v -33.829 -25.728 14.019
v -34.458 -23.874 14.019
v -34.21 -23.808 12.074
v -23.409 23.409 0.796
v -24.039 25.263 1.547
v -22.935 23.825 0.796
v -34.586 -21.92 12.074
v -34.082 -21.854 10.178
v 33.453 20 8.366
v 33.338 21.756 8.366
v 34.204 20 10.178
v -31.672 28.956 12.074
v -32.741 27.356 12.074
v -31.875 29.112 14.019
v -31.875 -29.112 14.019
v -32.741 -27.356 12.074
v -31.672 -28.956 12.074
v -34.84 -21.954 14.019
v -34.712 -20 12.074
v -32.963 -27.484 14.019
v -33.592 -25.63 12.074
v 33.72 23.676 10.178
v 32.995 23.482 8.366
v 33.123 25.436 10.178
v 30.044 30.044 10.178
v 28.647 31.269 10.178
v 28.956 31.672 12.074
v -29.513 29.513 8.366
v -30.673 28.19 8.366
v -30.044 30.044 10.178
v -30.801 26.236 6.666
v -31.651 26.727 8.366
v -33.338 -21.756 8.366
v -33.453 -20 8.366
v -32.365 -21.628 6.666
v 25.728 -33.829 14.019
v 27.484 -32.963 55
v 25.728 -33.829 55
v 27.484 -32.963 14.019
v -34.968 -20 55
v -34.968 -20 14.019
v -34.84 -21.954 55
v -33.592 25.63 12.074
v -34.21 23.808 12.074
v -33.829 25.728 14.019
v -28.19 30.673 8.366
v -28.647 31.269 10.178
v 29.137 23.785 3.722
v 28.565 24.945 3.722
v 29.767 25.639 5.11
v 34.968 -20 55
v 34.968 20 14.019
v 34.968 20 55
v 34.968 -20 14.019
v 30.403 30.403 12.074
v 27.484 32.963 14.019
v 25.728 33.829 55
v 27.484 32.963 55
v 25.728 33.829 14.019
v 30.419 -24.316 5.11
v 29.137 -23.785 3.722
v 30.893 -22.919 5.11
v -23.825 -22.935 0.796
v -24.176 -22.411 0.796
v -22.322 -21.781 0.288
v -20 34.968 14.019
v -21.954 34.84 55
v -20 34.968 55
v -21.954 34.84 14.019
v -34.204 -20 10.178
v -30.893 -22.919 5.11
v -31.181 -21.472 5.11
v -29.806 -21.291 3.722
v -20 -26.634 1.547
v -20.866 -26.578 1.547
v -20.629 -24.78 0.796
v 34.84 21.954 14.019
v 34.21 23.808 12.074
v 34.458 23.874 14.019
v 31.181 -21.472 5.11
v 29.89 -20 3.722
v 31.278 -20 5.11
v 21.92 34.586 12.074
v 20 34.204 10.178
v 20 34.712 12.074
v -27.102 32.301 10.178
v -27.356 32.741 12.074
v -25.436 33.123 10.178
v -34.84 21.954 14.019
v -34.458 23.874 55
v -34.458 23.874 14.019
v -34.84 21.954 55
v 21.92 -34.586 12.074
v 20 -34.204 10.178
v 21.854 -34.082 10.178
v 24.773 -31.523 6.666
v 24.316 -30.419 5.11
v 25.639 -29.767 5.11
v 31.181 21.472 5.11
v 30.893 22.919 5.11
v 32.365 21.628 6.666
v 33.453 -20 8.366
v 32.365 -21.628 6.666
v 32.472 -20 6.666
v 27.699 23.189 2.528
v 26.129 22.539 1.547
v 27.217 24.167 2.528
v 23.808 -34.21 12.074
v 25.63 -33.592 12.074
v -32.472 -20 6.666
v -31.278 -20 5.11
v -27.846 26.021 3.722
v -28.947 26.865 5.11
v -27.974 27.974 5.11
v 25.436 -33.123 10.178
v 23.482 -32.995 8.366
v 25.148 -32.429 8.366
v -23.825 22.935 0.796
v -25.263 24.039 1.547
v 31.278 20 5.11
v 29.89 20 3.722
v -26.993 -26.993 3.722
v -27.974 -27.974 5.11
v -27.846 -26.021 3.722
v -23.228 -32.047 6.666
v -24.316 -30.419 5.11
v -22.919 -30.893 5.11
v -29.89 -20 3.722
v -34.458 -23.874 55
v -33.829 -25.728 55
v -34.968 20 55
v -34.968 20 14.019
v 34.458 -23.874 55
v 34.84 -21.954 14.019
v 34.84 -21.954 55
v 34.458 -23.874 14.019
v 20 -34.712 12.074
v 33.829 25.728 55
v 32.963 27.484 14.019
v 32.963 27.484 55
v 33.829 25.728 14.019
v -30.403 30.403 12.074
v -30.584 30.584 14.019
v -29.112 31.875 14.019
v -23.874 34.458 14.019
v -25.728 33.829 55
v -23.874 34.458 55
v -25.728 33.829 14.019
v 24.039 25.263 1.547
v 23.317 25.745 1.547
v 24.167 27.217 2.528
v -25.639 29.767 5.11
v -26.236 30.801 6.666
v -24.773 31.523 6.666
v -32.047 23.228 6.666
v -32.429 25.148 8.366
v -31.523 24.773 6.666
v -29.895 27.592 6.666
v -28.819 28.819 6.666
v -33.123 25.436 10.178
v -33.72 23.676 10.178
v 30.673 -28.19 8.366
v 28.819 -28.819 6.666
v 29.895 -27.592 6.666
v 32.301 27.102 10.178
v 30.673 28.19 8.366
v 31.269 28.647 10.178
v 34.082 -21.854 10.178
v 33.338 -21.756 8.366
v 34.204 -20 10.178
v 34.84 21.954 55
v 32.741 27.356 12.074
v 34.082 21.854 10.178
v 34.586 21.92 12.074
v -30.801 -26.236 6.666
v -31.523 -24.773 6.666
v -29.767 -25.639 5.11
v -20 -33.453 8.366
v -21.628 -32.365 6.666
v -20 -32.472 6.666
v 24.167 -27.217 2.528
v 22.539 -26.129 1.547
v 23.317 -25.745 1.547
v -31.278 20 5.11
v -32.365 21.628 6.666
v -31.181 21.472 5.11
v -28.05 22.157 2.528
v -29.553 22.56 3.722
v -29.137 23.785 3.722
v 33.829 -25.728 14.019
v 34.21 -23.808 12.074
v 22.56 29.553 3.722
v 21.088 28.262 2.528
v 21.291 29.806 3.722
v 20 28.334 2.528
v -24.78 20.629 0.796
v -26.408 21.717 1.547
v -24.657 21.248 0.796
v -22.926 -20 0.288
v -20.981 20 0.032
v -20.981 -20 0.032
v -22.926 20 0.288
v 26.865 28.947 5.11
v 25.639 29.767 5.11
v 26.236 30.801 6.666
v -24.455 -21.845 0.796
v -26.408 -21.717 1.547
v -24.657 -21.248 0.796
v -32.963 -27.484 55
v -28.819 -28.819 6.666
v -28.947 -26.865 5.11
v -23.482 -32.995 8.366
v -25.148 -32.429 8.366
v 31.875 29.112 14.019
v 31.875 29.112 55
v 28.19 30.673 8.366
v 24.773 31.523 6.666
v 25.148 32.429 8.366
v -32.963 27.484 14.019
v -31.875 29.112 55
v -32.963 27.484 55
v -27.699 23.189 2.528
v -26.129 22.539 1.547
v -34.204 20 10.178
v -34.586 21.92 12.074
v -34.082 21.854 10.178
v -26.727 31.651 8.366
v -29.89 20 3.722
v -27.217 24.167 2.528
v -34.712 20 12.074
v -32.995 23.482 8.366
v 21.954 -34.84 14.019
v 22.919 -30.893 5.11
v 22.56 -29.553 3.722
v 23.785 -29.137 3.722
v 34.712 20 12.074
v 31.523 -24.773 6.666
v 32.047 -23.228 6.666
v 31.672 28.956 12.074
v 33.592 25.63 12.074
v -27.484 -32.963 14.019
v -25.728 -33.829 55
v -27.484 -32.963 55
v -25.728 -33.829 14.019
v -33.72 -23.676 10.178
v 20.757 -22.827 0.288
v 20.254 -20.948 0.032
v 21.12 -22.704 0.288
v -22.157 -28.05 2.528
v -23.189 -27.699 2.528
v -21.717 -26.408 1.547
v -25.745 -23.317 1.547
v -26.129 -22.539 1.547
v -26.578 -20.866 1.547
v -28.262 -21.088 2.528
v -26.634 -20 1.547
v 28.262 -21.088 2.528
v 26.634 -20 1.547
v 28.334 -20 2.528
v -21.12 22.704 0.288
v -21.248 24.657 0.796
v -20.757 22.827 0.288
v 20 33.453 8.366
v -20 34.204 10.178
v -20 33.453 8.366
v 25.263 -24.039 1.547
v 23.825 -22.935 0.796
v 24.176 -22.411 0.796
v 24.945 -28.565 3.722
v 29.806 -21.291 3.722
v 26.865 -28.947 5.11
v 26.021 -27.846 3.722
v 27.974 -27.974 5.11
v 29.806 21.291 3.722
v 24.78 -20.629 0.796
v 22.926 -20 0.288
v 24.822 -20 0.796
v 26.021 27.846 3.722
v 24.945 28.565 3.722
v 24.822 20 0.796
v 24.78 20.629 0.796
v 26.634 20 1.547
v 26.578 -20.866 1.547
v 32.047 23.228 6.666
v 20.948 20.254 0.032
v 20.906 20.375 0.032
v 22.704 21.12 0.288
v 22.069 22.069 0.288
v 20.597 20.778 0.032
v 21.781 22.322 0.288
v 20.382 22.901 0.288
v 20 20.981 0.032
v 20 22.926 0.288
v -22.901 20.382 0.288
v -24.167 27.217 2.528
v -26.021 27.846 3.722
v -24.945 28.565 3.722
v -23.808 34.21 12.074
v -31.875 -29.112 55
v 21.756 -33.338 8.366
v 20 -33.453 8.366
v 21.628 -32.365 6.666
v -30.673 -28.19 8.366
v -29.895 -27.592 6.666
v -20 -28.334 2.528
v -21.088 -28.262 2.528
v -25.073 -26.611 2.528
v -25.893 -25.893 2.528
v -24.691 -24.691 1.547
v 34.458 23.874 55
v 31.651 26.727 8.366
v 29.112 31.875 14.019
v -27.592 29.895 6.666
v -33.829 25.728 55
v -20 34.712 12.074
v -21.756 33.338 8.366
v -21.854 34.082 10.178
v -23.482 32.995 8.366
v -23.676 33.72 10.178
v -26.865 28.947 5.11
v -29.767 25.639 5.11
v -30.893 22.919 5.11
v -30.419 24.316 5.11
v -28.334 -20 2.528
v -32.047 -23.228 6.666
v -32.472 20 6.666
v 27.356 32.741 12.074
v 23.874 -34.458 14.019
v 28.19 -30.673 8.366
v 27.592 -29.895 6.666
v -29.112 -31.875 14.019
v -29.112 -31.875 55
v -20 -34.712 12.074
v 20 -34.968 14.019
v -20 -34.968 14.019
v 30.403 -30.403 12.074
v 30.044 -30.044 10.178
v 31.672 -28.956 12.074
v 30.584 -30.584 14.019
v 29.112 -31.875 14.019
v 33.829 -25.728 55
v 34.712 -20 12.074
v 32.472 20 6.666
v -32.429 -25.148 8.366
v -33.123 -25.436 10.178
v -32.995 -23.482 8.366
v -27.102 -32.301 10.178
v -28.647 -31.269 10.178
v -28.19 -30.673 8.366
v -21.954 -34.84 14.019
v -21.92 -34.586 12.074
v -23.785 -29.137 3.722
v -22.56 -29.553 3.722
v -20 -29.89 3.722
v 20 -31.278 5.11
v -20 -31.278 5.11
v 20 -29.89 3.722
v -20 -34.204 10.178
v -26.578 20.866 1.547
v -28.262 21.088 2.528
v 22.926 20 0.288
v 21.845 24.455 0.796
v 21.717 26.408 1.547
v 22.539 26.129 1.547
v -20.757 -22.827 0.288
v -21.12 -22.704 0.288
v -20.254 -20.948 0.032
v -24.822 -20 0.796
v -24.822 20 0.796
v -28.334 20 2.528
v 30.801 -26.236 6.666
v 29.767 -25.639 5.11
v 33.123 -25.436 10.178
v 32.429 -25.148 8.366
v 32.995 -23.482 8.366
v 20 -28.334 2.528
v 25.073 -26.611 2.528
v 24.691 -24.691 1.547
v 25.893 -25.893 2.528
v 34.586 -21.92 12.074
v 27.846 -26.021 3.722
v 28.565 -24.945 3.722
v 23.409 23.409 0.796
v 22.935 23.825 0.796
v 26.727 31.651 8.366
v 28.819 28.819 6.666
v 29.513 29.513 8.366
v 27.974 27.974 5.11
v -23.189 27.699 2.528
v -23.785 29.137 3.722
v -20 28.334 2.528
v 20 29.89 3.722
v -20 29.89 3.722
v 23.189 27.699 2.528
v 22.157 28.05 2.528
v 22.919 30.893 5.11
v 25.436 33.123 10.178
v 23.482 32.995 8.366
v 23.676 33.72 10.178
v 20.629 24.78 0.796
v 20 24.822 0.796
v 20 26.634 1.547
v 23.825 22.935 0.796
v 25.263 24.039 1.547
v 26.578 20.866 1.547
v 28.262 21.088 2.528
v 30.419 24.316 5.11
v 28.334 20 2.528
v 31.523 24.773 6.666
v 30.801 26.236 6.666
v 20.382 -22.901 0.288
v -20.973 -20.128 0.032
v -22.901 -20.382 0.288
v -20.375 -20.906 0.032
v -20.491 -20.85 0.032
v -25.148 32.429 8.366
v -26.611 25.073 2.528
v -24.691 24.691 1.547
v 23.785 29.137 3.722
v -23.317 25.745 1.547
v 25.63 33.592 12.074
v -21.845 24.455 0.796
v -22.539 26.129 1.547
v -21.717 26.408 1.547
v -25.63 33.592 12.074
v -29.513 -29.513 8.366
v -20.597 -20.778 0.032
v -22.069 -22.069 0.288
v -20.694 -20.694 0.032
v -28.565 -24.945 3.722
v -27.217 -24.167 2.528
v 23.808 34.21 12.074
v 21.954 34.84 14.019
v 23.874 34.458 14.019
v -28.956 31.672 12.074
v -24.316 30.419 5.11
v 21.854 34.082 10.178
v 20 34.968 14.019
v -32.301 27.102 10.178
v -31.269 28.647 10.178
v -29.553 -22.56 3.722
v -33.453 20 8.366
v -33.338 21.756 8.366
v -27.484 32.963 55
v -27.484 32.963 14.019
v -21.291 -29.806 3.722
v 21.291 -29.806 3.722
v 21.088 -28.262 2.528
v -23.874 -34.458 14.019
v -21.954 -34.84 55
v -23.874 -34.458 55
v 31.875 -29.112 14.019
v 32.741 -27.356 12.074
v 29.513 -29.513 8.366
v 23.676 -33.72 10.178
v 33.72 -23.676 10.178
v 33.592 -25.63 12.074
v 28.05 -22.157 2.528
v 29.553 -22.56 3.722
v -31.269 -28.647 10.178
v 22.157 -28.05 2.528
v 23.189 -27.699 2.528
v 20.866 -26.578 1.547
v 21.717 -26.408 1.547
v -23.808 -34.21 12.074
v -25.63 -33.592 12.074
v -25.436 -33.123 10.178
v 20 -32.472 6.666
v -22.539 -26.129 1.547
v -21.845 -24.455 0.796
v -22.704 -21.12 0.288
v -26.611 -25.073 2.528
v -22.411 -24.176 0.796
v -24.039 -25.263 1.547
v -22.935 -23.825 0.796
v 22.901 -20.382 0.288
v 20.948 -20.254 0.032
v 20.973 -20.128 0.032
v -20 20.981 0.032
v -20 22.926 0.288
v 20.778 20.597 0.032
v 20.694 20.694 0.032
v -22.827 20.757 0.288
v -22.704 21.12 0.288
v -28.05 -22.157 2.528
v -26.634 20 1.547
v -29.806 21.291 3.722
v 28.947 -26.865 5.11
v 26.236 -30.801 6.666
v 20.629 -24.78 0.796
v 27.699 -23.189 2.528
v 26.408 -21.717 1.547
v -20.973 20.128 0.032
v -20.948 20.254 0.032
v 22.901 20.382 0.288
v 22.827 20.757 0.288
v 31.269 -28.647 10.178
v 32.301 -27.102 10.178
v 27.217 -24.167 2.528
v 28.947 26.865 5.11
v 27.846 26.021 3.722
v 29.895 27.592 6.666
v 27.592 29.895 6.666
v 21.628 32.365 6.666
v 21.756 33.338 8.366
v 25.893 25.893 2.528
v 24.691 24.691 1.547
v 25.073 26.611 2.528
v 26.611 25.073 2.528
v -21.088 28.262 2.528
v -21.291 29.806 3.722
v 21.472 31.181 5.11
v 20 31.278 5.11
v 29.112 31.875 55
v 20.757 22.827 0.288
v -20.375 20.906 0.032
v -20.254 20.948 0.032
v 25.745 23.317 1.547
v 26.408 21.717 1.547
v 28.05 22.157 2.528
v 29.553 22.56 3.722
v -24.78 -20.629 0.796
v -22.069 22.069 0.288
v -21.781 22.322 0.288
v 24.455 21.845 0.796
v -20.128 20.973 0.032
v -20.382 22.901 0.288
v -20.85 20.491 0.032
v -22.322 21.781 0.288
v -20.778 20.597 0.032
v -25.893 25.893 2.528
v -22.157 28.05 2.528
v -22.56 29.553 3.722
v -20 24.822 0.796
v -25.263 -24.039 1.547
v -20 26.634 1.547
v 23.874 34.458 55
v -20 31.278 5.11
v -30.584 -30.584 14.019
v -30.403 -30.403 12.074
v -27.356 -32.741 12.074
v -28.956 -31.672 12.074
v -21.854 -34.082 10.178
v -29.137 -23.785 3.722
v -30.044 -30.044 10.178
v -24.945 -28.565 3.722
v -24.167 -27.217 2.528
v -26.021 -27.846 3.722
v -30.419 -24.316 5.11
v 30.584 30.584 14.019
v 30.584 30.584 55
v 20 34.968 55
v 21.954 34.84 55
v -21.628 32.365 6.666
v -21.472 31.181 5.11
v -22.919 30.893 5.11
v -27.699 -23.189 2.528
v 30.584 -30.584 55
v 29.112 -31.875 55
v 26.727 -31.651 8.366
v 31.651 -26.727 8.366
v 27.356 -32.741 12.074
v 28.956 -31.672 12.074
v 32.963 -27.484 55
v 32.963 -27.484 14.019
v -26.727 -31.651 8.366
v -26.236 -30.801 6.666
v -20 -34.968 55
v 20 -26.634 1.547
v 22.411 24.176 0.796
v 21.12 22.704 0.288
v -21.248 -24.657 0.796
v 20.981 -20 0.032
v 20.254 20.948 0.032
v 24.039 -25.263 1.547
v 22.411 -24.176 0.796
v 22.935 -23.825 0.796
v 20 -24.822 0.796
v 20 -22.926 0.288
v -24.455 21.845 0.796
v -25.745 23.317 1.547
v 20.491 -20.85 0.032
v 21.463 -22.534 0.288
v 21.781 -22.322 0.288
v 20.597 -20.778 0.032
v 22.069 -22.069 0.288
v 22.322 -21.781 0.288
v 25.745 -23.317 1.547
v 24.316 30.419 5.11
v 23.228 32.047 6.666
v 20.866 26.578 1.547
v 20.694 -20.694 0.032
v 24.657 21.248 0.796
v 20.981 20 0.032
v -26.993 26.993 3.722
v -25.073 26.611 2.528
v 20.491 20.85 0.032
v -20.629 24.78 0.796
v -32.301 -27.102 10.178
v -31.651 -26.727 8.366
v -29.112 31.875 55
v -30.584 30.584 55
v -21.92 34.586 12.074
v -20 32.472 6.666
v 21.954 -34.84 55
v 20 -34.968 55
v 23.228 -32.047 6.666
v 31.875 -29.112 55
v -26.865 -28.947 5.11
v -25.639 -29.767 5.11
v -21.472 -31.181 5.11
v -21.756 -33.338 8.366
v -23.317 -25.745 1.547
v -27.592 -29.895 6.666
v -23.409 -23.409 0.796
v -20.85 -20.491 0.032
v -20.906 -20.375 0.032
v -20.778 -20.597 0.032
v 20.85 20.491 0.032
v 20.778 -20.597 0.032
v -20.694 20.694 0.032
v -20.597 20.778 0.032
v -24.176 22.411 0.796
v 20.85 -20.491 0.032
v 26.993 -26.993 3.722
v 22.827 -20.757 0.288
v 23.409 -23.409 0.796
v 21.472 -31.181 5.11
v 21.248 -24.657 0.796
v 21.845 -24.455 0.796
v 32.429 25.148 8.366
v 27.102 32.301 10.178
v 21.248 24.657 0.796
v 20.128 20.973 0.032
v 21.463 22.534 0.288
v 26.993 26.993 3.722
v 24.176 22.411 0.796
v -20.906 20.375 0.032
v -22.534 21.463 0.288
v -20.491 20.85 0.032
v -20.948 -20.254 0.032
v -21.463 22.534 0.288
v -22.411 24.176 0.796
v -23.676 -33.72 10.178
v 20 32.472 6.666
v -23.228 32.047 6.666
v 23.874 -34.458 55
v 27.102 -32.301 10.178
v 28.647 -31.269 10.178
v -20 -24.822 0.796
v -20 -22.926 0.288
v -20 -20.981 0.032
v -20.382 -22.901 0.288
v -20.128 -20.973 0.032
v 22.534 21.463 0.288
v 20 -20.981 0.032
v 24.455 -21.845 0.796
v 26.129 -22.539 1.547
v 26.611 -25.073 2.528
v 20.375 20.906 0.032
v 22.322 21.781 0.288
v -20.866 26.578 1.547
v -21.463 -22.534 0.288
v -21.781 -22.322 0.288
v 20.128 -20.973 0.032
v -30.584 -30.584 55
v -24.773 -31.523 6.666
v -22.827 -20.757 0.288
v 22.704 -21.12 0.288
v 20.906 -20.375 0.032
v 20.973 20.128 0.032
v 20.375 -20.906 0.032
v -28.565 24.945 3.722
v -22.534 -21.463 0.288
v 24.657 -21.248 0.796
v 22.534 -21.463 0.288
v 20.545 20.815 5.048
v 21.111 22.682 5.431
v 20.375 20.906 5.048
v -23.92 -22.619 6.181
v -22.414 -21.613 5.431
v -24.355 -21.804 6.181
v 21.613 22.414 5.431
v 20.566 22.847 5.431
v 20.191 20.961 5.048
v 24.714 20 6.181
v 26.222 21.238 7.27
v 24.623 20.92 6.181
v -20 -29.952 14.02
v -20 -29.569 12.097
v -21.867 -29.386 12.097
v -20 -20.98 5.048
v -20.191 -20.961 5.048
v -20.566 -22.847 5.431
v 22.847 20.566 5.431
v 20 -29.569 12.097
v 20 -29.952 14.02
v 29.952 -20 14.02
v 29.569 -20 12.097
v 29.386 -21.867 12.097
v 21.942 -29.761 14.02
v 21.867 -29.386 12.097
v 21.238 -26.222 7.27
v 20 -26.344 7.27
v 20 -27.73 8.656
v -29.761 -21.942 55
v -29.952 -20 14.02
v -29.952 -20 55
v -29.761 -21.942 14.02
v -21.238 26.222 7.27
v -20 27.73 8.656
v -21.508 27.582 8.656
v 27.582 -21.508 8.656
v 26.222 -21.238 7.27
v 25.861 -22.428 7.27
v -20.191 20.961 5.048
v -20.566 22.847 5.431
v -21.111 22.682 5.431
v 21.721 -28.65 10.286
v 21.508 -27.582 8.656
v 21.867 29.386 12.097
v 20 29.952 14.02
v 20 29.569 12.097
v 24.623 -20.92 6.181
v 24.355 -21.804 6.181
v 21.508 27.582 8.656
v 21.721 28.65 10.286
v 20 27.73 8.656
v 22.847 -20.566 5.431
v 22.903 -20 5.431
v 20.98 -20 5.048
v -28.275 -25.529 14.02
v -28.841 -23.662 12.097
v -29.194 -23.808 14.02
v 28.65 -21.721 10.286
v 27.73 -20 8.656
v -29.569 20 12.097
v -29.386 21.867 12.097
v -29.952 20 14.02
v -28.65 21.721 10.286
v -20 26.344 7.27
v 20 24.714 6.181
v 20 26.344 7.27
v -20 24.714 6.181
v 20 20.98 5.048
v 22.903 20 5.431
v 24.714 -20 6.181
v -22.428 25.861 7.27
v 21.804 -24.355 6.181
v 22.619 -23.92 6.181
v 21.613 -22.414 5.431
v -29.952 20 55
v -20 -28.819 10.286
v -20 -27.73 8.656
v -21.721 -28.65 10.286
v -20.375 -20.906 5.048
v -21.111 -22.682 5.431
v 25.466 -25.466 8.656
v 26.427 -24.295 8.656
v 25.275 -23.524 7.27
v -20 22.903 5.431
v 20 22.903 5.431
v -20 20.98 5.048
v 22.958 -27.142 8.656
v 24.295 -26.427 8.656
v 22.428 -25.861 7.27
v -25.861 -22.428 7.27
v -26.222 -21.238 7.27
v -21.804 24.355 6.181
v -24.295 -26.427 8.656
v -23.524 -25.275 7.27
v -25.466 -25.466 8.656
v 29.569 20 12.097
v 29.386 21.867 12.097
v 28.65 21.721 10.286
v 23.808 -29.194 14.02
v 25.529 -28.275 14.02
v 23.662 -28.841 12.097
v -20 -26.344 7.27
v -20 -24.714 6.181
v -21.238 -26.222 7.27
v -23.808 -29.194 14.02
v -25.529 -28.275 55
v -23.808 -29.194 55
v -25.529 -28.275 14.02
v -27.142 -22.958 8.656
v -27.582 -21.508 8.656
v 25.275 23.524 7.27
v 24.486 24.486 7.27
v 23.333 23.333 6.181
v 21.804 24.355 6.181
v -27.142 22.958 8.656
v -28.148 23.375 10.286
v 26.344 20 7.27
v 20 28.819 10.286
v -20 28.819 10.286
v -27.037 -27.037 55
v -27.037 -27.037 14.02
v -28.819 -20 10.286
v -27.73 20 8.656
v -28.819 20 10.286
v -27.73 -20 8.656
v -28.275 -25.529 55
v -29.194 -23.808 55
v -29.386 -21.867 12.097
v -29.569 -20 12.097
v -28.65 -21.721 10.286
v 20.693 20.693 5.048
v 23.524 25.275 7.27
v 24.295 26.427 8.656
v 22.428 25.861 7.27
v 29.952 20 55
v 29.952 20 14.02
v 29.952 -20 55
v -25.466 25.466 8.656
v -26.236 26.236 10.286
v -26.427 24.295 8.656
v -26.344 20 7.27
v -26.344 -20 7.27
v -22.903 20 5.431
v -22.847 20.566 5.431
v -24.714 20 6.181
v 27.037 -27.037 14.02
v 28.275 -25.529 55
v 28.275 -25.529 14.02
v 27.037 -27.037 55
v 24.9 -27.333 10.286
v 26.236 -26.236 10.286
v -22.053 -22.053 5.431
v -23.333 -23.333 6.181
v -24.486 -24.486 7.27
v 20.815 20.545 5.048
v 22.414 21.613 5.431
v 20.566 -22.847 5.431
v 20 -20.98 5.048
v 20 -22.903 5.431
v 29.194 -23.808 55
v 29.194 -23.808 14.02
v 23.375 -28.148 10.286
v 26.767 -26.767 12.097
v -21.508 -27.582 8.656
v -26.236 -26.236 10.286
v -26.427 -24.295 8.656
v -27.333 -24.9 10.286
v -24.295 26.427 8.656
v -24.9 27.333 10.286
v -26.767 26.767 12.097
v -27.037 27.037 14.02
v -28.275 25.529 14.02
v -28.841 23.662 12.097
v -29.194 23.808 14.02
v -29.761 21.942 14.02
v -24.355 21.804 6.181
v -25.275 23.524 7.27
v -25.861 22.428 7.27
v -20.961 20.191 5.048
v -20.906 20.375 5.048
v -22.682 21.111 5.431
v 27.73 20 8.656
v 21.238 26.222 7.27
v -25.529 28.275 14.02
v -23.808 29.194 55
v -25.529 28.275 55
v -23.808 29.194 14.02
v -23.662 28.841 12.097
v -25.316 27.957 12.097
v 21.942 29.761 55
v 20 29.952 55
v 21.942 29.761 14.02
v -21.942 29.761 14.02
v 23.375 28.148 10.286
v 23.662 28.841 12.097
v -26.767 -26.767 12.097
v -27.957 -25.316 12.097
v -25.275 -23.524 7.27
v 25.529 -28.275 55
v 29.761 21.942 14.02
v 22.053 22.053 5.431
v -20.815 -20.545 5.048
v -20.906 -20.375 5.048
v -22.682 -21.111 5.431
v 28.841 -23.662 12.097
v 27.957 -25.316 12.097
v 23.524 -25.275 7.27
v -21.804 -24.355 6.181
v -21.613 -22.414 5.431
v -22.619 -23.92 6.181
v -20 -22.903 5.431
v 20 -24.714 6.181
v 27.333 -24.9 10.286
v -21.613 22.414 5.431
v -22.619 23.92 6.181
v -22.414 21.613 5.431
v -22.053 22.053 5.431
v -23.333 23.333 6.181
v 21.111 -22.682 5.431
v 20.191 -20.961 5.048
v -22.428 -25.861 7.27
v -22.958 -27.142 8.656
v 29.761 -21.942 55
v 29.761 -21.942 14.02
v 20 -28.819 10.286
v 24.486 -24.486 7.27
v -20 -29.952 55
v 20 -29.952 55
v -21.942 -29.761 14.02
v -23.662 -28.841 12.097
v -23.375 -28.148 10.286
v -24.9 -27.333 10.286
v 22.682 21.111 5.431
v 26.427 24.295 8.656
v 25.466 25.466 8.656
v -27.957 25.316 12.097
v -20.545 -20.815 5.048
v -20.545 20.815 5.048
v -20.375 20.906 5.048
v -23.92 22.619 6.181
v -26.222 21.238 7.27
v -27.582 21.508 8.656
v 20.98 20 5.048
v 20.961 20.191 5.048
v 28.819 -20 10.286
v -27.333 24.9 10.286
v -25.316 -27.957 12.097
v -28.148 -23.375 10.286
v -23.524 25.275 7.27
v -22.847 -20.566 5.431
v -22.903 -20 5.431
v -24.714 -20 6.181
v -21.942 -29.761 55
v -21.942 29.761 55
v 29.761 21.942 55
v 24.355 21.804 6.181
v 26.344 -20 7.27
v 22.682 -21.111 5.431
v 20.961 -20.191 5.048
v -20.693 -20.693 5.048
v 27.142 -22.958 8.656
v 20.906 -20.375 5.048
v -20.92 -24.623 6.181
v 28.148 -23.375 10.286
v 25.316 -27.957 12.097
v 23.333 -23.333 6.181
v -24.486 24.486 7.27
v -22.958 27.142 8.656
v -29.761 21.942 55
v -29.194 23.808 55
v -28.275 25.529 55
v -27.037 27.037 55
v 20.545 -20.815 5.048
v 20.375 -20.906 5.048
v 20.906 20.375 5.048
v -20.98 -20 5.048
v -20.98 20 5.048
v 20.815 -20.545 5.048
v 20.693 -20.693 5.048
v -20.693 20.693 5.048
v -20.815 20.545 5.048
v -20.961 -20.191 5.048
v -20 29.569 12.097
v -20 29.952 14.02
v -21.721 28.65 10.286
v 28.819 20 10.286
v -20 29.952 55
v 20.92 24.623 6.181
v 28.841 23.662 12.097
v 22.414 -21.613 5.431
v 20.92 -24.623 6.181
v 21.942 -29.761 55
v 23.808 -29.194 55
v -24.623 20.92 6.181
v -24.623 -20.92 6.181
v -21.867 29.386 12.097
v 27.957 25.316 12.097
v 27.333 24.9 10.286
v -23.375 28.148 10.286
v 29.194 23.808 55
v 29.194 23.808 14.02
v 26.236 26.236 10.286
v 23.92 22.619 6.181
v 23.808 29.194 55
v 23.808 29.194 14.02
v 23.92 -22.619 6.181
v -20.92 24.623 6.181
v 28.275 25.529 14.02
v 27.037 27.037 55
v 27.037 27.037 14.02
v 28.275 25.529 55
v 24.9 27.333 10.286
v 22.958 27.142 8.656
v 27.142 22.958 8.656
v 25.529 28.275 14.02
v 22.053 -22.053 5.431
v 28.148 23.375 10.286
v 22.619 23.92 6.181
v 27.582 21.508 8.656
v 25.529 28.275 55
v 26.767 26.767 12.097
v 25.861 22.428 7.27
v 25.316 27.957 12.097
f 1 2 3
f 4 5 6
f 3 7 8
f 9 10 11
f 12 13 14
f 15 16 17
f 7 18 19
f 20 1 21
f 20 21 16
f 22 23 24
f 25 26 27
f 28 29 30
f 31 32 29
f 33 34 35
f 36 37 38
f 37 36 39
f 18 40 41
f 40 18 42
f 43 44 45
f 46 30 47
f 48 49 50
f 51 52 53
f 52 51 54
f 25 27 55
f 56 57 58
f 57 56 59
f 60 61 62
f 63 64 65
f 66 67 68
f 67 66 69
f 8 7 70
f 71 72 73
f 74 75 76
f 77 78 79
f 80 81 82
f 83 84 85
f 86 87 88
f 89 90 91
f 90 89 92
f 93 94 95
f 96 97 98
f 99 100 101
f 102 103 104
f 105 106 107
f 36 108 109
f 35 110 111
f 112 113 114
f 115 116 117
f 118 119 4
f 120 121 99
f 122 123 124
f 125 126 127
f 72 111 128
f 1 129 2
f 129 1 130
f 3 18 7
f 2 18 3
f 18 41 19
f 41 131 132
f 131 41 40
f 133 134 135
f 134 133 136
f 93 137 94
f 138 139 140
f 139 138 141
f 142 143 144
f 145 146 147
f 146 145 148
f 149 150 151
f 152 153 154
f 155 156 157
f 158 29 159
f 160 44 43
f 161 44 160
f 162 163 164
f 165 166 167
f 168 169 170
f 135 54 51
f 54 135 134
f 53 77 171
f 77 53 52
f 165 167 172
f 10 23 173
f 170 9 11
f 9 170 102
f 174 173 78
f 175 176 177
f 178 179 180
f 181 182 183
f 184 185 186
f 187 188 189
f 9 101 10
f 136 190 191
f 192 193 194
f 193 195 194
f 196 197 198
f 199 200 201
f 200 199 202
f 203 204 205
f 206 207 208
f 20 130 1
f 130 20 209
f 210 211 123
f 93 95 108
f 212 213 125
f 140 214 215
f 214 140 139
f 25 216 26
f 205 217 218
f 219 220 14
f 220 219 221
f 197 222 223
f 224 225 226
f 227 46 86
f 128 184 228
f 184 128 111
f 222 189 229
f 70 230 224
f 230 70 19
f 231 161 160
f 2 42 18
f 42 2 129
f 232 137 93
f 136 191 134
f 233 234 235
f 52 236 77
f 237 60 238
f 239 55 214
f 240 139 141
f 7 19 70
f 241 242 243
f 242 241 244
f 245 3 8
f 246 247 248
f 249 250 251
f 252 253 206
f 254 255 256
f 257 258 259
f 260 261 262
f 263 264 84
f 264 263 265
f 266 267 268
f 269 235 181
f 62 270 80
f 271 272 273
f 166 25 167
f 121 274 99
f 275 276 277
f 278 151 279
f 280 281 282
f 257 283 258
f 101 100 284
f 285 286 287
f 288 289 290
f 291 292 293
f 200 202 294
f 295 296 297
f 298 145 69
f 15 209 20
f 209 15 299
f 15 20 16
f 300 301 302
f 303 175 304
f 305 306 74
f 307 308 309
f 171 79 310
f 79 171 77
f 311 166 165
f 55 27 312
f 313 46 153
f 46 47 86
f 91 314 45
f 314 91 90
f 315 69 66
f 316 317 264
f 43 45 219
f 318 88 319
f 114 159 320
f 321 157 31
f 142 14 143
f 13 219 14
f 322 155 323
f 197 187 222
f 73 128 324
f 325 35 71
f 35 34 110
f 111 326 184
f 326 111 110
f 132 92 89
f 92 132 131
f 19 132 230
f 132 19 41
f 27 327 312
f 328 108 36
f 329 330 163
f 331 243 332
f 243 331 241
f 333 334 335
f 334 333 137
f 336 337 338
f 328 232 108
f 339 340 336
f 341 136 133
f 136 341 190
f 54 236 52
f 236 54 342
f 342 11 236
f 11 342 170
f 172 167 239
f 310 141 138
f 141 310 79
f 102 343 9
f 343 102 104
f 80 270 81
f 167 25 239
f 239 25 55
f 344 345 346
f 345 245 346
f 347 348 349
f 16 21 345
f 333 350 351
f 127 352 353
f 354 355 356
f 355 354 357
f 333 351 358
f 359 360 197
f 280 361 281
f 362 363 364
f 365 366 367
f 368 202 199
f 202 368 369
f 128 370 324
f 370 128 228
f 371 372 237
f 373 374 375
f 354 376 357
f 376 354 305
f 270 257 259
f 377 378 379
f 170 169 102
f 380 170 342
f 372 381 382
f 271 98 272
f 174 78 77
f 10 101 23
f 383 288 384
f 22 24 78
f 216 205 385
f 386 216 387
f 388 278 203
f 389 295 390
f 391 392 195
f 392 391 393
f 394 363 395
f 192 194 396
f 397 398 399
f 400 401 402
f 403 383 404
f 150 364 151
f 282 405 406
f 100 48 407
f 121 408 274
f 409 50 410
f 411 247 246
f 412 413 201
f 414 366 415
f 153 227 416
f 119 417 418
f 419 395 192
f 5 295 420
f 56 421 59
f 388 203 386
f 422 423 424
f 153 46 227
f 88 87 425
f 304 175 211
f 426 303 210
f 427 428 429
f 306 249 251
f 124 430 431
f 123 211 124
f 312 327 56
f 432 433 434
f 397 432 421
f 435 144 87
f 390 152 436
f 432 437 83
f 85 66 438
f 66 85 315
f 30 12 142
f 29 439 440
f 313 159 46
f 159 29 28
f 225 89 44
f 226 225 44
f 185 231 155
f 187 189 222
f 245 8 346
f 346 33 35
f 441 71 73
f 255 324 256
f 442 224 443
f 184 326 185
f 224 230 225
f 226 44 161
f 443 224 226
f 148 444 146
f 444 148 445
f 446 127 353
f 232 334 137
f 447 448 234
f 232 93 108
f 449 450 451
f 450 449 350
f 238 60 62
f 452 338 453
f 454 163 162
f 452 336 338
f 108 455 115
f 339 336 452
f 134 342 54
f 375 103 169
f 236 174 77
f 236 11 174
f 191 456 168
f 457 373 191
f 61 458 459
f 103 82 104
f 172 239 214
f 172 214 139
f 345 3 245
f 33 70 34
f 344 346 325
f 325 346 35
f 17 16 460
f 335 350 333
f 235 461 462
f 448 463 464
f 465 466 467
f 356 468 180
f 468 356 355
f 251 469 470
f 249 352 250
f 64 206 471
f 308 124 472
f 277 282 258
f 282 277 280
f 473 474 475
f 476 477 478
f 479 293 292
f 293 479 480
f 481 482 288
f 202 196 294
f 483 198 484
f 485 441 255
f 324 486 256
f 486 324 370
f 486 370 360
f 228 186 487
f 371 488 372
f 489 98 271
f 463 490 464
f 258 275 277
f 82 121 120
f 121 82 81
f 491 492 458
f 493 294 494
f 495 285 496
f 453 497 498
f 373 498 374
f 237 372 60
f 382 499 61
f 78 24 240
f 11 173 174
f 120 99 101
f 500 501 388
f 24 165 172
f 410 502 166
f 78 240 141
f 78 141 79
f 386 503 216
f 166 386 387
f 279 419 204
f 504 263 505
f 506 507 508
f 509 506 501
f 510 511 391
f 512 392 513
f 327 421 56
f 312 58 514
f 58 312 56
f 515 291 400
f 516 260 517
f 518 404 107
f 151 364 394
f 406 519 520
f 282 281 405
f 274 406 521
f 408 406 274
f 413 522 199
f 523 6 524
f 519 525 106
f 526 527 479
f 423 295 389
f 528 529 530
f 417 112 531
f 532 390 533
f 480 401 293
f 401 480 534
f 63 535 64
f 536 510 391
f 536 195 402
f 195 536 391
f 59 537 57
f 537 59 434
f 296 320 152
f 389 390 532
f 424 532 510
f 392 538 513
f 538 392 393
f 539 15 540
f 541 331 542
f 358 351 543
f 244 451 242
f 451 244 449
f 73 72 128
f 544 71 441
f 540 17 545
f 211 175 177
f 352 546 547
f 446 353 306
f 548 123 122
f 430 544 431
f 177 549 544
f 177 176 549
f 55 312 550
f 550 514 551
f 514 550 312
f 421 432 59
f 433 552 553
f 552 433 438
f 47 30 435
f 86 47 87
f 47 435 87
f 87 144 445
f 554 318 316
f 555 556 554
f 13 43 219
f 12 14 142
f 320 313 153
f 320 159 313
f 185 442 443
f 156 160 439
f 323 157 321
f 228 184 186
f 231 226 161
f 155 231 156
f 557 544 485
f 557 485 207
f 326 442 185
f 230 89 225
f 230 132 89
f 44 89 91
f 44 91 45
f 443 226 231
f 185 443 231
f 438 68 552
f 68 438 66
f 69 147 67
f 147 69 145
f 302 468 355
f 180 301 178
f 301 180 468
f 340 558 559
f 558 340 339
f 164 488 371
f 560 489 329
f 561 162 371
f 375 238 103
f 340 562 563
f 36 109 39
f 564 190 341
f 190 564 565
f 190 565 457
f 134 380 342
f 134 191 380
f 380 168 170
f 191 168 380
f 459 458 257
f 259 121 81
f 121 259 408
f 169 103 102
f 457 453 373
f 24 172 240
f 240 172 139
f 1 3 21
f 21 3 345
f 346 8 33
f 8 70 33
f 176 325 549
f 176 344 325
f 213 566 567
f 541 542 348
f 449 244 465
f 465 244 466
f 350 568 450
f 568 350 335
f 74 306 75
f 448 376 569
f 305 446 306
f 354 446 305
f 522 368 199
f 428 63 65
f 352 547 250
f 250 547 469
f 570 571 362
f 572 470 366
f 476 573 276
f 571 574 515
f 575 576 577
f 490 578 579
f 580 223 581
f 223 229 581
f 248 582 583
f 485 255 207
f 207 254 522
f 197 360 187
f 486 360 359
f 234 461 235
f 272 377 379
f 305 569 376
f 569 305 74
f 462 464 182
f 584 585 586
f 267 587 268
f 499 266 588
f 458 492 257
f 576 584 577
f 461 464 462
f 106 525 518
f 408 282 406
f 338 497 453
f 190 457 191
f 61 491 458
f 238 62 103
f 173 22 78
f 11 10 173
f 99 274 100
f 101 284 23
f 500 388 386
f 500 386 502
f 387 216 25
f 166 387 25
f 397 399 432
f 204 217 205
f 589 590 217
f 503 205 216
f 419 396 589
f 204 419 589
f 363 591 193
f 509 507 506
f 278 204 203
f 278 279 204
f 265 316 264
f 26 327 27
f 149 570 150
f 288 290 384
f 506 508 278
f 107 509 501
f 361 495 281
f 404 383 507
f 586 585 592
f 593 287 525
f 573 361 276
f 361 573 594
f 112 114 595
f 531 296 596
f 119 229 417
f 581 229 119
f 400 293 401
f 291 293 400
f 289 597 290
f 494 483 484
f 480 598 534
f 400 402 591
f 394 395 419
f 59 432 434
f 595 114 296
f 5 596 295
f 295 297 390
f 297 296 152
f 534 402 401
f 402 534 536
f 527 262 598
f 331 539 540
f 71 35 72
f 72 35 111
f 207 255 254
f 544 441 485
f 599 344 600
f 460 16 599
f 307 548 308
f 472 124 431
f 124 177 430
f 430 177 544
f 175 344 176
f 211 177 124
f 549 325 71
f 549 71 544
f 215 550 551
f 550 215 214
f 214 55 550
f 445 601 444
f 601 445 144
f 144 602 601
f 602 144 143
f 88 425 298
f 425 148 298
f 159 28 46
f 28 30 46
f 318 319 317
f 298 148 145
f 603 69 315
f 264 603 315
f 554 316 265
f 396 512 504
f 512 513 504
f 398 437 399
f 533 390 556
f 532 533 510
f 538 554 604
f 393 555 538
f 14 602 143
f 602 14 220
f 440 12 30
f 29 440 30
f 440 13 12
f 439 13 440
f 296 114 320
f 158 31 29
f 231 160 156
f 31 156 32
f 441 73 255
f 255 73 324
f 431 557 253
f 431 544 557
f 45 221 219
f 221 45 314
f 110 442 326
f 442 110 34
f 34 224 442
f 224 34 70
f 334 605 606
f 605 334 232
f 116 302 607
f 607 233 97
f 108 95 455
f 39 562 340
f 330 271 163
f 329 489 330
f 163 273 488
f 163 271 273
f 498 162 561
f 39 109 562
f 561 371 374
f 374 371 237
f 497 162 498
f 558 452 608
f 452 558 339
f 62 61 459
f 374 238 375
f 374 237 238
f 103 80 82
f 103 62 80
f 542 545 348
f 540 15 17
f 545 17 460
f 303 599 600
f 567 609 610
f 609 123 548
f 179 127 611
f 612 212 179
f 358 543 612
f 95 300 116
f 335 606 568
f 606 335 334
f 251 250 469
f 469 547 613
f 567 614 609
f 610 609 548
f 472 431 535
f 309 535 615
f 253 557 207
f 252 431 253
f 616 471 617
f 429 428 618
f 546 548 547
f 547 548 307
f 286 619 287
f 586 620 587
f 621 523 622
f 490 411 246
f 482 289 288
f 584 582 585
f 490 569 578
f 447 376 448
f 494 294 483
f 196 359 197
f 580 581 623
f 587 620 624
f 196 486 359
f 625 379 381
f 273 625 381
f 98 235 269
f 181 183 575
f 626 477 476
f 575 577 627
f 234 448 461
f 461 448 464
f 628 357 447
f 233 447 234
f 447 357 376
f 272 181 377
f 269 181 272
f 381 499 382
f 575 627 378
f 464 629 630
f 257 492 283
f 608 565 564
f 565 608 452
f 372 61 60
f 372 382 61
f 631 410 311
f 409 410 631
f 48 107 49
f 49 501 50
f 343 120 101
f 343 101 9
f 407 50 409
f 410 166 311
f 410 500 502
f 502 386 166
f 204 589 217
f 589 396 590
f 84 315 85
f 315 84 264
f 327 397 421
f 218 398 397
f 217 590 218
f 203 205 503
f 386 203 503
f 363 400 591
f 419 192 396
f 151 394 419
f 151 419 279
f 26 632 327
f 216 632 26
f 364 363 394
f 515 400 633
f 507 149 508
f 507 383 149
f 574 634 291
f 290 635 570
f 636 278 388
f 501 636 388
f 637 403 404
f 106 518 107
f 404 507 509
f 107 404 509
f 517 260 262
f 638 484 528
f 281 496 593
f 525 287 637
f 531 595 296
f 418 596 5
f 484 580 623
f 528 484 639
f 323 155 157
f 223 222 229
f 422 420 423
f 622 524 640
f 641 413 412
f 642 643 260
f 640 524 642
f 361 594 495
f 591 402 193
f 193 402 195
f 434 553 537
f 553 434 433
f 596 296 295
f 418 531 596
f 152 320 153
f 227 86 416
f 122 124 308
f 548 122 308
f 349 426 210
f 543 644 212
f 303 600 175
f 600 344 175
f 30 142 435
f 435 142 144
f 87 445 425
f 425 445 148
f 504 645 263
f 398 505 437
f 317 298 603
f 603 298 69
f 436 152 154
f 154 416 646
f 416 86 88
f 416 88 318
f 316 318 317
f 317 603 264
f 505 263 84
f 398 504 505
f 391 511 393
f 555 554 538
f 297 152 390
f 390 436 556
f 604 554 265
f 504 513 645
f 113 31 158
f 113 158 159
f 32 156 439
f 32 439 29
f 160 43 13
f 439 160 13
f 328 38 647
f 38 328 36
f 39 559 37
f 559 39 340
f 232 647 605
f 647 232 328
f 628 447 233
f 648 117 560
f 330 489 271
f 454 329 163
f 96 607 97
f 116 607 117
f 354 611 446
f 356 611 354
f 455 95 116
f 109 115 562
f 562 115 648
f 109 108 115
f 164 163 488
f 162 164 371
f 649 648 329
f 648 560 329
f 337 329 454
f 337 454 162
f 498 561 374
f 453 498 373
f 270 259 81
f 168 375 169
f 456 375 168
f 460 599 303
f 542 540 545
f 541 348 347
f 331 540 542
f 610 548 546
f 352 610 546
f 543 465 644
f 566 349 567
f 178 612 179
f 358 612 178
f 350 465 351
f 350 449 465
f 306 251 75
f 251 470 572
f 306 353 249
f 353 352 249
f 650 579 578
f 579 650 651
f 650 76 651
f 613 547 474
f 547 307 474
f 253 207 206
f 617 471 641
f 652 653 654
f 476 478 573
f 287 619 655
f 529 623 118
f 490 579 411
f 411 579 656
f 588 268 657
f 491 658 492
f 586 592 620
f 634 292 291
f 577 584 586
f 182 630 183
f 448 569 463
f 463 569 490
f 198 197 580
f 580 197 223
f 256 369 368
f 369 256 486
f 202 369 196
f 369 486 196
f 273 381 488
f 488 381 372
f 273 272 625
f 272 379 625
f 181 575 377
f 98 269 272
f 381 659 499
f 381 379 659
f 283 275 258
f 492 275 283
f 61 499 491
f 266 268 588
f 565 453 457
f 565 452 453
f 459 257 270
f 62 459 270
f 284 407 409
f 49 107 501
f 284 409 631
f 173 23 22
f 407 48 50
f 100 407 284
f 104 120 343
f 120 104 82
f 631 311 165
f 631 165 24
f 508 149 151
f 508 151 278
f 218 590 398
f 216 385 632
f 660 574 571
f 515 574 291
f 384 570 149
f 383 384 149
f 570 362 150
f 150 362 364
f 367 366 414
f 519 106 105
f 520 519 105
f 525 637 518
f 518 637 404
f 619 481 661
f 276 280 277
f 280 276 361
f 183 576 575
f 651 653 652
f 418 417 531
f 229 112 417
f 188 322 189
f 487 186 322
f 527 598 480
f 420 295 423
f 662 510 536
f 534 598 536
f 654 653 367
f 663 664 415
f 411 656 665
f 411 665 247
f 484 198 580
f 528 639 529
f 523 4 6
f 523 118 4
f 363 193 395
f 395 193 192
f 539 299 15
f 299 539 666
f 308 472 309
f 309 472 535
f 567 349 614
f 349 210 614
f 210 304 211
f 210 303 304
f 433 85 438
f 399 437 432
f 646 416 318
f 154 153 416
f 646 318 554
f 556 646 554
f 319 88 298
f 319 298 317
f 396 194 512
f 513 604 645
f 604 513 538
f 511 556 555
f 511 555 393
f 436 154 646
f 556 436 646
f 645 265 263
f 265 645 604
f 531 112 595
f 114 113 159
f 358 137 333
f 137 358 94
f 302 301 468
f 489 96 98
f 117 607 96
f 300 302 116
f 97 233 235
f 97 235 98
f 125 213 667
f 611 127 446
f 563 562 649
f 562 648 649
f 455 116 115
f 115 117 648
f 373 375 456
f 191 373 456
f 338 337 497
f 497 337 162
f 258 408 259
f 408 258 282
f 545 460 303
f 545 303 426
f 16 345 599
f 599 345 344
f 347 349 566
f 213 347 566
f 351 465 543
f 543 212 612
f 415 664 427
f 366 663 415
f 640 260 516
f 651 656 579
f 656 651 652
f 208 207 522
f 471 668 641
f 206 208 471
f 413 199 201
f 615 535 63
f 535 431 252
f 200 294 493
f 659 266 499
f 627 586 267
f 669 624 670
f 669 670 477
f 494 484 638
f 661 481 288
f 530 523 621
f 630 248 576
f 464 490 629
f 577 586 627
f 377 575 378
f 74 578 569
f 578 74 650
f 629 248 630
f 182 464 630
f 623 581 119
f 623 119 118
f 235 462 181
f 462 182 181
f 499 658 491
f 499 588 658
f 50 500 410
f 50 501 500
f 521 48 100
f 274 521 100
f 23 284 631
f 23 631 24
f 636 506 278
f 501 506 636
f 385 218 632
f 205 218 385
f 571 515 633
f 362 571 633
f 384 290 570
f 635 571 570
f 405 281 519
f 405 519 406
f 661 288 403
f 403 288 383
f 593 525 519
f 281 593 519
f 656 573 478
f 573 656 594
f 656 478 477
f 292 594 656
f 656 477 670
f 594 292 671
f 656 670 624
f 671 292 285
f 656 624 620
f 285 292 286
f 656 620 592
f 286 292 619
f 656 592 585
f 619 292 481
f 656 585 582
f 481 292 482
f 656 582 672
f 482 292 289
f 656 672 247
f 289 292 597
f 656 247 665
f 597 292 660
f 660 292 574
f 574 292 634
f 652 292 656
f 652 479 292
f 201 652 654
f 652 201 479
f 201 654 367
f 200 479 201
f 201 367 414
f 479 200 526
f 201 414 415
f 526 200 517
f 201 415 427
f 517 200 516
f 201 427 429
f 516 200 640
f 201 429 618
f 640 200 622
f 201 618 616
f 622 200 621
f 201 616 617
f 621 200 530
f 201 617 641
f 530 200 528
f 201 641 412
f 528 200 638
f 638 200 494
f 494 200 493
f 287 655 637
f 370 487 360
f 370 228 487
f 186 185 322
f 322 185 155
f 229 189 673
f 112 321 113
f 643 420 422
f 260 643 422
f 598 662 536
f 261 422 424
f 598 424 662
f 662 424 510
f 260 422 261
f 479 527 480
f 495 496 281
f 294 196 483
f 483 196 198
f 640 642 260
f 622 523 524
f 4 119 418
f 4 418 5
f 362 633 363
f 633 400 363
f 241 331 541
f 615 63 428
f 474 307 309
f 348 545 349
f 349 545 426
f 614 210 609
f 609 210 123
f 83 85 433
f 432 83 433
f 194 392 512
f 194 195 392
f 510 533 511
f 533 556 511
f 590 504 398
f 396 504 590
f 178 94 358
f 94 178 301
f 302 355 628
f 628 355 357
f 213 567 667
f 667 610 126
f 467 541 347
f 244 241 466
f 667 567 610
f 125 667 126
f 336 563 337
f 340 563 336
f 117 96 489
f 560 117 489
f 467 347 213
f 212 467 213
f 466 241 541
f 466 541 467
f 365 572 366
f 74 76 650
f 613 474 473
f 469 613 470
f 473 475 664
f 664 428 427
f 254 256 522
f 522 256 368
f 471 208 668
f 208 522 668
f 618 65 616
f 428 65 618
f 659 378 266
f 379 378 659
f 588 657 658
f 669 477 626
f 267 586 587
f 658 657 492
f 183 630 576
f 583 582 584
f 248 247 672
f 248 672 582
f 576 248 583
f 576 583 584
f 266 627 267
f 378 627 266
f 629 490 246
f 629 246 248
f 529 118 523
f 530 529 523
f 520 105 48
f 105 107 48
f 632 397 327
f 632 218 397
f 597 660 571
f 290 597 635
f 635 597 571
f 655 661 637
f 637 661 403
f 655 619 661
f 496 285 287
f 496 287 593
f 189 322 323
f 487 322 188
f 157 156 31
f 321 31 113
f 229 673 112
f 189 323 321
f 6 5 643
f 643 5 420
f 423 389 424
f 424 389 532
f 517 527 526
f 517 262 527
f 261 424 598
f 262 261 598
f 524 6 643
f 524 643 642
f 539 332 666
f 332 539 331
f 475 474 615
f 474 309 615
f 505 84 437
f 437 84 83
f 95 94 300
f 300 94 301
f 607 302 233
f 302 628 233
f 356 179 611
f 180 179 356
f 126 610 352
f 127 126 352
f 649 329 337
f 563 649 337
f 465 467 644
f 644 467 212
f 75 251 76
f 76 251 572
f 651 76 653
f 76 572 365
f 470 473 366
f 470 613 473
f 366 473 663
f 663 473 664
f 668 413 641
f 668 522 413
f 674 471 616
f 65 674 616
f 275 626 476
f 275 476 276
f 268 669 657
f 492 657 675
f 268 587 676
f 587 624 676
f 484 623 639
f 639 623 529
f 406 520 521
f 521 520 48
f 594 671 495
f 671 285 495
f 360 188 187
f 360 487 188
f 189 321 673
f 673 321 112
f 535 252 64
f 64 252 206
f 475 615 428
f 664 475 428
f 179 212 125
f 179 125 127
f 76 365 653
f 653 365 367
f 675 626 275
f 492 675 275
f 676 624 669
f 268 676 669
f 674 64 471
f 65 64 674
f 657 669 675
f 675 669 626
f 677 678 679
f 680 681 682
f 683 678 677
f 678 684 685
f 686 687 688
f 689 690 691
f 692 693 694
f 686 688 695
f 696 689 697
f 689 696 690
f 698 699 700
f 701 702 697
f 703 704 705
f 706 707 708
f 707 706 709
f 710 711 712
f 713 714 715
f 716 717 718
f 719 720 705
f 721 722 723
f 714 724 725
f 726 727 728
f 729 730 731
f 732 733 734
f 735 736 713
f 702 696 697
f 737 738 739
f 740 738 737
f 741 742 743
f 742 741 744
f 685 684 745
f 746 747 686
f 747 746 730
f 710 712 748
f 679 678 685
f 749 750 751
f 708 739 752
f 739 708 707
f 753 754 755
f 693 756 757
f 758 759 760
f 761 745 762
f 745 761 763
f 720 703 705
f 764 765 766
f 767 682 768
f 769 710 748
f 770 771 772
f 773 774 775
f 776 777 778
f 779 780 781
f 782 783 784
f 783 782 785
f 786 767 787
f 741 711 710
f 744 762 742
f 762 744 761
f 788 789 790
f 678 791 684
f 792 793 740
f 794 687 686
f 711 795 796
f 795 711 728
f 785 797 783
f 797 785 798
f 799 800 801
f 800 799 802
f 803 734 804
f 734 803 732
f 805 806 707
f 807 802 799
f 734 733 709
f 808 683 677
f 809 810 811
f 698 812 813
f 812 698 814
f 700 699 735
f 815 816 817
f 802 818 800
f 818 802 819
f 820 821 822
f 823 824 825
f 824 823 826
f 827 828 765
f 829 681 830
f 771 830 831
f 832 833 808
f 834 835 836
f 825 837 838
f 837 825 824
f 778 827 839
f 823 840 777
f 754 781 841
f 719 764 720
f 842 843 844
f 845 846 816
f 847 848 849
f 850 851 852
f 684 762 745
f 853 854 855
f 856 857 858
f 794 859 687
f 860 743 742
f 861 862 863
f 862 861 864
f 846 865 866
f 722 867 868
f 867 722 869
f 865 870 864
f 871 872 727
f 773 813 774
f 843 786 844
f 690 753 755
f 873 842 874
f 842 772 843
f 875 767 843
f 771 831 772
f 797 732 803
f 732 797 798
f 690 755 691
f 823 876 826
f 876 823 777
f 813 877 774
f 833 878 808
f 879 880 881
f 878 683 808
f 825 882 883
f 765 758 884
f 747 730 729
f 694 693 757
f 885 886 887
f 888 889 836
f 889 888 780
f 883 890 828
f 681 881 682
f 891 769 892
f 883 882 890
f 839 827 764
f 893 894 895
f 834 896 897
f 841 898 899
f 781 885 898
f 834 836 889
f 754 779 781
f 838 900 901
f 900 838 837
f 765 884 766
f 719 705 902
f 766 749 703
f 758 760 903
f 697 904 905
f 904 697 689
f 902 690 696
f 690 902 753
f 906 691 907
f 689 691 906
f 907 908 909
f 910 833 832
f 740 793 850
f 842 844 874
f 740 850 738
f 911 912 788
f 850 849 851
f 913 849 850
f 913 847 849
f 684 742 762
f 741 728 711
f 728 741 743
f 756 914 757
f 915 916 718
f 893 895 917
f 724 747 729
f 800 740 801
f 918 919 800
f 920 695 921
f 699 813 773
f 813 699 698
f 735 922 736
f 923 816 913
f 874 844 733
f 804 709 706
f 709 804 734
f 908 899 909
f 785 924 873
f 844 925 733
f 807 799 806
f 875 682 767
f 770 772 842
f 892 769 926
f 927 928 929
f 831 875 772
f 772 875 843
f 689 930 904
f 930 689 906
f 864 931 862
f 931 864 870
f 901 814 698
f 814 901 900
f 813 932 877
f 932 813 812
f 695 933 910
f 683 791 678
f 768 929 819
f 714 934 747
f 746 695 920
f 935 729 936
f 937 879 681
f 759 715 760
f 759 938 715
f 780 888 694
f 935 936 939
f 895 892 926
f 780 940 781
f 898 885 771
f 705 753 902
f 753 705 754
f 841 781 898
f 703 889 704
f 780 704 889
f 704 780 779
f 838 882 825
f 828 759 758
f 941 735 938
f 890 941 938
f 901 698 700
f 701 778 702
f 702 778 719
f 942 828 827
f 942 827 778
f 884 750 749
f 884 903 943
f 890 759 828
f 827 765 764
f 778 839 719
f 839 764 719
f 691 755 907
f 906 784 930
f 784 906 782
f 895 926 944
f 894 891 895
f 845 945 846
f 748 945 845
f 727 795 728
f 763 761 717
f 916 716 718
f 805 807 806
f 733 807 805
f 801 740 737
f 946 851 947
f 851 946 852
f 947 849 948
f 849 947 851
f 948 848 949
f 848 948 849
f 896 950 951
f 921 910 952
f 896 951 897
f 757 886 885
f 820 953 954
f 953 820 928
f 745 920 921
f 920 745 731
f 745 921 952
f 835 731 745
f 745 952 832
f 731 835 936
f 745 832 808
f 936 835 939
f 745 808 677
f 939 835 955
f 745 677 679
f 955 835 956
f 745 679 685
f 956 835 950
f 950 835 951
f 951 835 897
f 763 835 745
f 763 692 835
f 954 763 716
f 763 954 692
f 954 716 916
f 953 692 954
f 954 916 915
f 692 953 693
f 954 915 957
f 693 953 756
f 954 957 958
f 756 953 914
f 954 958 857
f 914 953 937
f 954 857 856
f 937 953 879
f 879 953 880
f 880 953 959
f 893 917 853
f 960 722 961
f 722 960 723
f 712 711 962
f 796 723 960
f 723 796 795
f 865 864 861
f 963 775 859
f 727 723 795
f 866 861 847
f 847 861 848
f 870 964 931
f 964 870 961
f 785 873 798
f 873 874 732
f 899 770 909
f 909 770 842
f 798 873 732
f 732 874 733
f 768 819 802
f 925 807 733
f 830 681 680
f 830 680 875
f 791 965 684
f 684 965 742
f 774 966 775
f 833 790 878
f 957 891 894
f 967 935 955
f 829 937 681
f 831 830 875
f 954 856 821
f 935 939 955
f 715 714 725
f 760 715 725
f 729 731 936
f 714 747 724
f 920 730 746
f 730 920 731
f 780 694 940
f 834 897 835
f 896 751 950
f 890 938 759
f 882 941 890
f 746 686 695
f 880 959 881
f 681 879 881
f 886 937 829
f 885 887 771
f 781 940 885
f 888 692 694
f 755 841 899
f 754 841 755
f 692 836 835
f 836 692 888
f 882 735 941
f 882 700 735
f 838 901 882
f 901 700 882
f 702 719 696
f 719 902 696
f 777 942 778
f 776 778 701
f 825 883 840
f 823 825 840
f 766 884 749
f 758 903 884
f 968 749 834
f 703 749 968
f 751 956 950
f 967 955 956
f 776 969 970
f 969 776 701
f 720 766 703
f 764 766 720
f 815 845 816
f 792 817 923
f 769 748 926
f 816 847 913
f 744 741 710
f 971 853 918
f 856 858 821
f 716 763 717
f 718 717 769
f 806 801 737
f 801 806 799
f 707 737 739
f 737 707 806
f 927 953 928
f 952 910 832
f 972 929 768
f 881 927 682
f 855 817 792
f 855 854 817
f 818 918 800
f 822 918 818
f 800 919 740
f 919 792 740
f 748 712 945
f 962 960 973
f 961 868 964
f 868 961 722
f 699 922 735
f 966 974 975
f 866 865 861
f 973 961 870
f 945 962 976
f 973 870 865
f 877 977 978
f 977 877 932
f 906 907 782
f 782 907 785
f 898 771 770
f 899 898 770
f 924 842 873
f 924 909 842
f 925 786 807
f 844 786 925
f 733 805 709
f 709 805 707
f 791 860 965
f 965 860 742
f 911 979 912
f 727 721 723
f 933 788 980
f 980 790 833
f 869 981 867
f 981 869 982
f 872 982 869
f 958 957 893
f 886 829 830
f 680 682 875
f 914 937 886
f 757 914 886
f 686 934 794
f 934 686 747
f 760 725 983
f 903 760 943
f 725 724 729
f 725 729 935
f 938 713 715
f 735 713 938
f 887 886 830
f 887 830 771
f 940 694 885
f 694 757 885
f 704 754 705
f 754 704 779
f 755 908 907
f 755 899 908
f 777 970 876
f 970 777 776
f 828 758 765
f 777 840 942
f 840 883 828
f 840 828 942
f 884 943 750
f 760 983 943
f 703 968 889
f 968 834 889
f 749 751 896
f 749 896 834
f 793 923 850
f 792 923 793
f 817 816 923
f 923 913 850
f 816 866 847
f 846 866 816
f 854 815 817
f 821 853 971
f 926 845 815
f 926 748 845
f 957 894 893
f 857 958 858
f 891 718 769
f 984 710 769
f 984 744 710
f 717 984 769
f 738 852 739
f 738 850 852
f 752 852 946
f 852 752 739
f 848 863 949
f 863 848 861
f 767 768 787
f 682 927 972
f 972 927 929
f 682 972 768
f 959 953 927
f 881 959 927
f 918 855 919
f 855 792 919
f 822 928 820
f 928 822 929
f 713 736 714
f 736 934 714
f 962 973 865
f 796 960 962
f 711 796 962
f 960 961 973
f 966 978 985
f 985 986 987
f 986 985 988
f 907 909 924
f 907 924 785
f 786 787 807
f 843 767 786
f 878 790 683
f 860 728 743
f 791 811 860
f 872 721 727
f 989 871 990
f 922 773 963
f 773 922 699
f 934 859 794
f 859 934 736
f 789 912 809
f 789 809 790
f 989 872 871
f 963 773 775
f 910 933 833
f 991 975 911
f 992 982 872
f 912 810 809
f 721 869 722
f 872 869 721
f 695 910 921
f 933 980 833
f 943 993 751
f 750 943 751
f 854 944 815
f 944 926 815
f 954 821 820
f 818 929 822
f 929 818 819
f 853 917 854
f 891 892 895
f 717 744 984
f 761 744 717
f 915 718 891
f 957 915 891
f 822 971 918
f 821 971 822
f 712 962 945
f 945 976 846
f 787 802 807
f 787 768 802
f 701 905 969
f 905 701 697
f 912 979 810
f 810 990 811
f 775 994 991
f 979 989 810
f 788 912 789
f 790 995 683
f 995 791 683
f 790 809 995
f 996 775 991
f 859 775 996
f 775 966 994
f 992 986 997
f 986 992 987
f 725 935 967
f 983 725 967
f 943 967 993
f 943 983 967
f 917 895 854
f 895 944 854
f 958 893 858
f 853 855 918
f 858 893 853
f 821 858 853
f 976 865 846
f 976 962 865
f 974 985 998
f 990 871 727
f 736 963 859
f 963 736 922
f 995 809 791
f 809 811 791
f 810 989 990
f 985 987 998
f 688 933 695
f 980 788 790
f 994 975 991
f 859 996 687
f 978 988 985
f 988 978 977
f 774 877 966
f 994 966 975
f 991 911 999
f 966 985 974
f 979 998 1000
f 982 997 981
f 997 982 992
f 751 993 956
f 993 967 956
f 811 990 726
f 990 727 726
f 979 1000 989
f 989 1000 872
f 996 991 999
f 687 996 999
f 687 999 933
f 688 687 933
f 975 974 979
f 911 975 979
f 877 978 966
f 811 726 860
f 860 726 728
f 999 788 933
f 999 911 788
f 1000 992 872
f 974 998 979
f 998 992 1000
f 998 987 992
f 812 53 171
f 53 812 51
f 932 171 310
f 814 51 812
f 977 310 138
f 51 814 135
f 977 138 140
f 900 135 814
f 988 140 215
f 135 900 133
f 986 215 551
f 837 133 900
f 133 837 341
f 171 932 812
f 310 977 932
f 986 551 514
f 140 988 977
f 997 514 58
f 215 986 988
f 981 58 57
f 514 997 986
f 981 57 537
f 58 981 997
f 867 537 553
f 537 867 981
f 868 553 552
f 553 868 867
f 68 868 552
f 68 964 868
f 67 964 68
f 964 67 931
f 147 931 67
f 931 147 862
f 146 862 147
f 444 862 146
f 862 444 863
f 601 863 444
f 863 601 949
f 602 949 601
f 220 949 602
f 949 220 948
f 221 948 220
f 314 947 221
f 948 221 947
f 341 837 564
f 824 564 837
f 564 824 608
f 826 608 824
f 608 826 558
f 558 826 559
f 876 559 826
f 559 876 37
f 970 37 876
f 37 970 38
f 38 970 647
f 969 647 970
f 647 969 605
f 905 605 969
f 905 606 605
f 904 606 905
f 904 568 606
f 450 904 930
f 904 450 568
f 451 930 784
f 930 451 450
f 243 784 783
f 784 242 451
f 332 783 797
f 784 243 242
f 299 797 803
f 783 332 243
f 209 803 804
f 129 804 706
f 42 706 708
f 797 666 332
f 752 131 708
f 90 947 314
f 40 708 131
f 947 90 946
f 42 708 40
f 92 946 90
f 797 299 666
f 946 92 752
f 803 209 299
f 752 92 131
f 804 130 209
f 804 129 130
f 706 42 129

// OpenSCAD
//Make a box or a lid:
type="box";//[box,lid]

//Outer height of box with lid:
height=70;//[20:150]
//Outer width of box:
width=70;//[20:150]
//Outer depth of box:
depth=70;//[20:200]

//curvature of sides:
roundness=15;//[5:30]
// How smooth the rounded corners are. 10 is standard, 5 is quite smooth.
$fa=5;//[1:20]

//How thick the walls are:
thickness=5;//[1:20]

//How much space is between lid inset and inside of box:
wiggle_room=1;//[0:3]
//How deep the lid inset is:
flange_height=2;//[0:10]



inner_radius=roundness-thickness;
if(type=="lid"){
translate([-width/2+roundness,-depth/2+roundness,0]){
difference(){
	translate([0,0,roundness]){
	minkowski(){
		cube([width-2*roundness,depth-2*roundness,70-2*roundness]);
		sphere(roundness);}
}
translate([-roundness-1,-roundness-1,roundness])
cube([width+2,depth+2,roundness+70+1]);}
translate([wiggle_room/2,wiggle_room/2,roundness]){
	linear_extrude(height=flange_height){
		minkowski(){
		square([width-2*(inner_radius+thickness)-wiggle_room,depth-2*(inner_radius+thickness)-wiggle_room]);
	circle(inner_radius);}
}}}}

if (type=="box"){
if (inner_radius>0){
translate([-width/2+roundness,-depth/2+roundness,0]){
difference(){
	translate([0,0,roundness]){
	difference(){
	minkowski(){
		cube([width-2*roundness,depth-2*roundness,height-2*roundness]);
		sphere(roundness);}
	minkowski(){
		cube([width-2*(inner_radius+thickness),depth-2*(inner_radius+thickness),height-2*(thickness)]);
		sphere(inner_radius);}
}}
translate([-roundness,-roundness,height-roundness])
cube([width,depth,roundness+1]);}}}}
